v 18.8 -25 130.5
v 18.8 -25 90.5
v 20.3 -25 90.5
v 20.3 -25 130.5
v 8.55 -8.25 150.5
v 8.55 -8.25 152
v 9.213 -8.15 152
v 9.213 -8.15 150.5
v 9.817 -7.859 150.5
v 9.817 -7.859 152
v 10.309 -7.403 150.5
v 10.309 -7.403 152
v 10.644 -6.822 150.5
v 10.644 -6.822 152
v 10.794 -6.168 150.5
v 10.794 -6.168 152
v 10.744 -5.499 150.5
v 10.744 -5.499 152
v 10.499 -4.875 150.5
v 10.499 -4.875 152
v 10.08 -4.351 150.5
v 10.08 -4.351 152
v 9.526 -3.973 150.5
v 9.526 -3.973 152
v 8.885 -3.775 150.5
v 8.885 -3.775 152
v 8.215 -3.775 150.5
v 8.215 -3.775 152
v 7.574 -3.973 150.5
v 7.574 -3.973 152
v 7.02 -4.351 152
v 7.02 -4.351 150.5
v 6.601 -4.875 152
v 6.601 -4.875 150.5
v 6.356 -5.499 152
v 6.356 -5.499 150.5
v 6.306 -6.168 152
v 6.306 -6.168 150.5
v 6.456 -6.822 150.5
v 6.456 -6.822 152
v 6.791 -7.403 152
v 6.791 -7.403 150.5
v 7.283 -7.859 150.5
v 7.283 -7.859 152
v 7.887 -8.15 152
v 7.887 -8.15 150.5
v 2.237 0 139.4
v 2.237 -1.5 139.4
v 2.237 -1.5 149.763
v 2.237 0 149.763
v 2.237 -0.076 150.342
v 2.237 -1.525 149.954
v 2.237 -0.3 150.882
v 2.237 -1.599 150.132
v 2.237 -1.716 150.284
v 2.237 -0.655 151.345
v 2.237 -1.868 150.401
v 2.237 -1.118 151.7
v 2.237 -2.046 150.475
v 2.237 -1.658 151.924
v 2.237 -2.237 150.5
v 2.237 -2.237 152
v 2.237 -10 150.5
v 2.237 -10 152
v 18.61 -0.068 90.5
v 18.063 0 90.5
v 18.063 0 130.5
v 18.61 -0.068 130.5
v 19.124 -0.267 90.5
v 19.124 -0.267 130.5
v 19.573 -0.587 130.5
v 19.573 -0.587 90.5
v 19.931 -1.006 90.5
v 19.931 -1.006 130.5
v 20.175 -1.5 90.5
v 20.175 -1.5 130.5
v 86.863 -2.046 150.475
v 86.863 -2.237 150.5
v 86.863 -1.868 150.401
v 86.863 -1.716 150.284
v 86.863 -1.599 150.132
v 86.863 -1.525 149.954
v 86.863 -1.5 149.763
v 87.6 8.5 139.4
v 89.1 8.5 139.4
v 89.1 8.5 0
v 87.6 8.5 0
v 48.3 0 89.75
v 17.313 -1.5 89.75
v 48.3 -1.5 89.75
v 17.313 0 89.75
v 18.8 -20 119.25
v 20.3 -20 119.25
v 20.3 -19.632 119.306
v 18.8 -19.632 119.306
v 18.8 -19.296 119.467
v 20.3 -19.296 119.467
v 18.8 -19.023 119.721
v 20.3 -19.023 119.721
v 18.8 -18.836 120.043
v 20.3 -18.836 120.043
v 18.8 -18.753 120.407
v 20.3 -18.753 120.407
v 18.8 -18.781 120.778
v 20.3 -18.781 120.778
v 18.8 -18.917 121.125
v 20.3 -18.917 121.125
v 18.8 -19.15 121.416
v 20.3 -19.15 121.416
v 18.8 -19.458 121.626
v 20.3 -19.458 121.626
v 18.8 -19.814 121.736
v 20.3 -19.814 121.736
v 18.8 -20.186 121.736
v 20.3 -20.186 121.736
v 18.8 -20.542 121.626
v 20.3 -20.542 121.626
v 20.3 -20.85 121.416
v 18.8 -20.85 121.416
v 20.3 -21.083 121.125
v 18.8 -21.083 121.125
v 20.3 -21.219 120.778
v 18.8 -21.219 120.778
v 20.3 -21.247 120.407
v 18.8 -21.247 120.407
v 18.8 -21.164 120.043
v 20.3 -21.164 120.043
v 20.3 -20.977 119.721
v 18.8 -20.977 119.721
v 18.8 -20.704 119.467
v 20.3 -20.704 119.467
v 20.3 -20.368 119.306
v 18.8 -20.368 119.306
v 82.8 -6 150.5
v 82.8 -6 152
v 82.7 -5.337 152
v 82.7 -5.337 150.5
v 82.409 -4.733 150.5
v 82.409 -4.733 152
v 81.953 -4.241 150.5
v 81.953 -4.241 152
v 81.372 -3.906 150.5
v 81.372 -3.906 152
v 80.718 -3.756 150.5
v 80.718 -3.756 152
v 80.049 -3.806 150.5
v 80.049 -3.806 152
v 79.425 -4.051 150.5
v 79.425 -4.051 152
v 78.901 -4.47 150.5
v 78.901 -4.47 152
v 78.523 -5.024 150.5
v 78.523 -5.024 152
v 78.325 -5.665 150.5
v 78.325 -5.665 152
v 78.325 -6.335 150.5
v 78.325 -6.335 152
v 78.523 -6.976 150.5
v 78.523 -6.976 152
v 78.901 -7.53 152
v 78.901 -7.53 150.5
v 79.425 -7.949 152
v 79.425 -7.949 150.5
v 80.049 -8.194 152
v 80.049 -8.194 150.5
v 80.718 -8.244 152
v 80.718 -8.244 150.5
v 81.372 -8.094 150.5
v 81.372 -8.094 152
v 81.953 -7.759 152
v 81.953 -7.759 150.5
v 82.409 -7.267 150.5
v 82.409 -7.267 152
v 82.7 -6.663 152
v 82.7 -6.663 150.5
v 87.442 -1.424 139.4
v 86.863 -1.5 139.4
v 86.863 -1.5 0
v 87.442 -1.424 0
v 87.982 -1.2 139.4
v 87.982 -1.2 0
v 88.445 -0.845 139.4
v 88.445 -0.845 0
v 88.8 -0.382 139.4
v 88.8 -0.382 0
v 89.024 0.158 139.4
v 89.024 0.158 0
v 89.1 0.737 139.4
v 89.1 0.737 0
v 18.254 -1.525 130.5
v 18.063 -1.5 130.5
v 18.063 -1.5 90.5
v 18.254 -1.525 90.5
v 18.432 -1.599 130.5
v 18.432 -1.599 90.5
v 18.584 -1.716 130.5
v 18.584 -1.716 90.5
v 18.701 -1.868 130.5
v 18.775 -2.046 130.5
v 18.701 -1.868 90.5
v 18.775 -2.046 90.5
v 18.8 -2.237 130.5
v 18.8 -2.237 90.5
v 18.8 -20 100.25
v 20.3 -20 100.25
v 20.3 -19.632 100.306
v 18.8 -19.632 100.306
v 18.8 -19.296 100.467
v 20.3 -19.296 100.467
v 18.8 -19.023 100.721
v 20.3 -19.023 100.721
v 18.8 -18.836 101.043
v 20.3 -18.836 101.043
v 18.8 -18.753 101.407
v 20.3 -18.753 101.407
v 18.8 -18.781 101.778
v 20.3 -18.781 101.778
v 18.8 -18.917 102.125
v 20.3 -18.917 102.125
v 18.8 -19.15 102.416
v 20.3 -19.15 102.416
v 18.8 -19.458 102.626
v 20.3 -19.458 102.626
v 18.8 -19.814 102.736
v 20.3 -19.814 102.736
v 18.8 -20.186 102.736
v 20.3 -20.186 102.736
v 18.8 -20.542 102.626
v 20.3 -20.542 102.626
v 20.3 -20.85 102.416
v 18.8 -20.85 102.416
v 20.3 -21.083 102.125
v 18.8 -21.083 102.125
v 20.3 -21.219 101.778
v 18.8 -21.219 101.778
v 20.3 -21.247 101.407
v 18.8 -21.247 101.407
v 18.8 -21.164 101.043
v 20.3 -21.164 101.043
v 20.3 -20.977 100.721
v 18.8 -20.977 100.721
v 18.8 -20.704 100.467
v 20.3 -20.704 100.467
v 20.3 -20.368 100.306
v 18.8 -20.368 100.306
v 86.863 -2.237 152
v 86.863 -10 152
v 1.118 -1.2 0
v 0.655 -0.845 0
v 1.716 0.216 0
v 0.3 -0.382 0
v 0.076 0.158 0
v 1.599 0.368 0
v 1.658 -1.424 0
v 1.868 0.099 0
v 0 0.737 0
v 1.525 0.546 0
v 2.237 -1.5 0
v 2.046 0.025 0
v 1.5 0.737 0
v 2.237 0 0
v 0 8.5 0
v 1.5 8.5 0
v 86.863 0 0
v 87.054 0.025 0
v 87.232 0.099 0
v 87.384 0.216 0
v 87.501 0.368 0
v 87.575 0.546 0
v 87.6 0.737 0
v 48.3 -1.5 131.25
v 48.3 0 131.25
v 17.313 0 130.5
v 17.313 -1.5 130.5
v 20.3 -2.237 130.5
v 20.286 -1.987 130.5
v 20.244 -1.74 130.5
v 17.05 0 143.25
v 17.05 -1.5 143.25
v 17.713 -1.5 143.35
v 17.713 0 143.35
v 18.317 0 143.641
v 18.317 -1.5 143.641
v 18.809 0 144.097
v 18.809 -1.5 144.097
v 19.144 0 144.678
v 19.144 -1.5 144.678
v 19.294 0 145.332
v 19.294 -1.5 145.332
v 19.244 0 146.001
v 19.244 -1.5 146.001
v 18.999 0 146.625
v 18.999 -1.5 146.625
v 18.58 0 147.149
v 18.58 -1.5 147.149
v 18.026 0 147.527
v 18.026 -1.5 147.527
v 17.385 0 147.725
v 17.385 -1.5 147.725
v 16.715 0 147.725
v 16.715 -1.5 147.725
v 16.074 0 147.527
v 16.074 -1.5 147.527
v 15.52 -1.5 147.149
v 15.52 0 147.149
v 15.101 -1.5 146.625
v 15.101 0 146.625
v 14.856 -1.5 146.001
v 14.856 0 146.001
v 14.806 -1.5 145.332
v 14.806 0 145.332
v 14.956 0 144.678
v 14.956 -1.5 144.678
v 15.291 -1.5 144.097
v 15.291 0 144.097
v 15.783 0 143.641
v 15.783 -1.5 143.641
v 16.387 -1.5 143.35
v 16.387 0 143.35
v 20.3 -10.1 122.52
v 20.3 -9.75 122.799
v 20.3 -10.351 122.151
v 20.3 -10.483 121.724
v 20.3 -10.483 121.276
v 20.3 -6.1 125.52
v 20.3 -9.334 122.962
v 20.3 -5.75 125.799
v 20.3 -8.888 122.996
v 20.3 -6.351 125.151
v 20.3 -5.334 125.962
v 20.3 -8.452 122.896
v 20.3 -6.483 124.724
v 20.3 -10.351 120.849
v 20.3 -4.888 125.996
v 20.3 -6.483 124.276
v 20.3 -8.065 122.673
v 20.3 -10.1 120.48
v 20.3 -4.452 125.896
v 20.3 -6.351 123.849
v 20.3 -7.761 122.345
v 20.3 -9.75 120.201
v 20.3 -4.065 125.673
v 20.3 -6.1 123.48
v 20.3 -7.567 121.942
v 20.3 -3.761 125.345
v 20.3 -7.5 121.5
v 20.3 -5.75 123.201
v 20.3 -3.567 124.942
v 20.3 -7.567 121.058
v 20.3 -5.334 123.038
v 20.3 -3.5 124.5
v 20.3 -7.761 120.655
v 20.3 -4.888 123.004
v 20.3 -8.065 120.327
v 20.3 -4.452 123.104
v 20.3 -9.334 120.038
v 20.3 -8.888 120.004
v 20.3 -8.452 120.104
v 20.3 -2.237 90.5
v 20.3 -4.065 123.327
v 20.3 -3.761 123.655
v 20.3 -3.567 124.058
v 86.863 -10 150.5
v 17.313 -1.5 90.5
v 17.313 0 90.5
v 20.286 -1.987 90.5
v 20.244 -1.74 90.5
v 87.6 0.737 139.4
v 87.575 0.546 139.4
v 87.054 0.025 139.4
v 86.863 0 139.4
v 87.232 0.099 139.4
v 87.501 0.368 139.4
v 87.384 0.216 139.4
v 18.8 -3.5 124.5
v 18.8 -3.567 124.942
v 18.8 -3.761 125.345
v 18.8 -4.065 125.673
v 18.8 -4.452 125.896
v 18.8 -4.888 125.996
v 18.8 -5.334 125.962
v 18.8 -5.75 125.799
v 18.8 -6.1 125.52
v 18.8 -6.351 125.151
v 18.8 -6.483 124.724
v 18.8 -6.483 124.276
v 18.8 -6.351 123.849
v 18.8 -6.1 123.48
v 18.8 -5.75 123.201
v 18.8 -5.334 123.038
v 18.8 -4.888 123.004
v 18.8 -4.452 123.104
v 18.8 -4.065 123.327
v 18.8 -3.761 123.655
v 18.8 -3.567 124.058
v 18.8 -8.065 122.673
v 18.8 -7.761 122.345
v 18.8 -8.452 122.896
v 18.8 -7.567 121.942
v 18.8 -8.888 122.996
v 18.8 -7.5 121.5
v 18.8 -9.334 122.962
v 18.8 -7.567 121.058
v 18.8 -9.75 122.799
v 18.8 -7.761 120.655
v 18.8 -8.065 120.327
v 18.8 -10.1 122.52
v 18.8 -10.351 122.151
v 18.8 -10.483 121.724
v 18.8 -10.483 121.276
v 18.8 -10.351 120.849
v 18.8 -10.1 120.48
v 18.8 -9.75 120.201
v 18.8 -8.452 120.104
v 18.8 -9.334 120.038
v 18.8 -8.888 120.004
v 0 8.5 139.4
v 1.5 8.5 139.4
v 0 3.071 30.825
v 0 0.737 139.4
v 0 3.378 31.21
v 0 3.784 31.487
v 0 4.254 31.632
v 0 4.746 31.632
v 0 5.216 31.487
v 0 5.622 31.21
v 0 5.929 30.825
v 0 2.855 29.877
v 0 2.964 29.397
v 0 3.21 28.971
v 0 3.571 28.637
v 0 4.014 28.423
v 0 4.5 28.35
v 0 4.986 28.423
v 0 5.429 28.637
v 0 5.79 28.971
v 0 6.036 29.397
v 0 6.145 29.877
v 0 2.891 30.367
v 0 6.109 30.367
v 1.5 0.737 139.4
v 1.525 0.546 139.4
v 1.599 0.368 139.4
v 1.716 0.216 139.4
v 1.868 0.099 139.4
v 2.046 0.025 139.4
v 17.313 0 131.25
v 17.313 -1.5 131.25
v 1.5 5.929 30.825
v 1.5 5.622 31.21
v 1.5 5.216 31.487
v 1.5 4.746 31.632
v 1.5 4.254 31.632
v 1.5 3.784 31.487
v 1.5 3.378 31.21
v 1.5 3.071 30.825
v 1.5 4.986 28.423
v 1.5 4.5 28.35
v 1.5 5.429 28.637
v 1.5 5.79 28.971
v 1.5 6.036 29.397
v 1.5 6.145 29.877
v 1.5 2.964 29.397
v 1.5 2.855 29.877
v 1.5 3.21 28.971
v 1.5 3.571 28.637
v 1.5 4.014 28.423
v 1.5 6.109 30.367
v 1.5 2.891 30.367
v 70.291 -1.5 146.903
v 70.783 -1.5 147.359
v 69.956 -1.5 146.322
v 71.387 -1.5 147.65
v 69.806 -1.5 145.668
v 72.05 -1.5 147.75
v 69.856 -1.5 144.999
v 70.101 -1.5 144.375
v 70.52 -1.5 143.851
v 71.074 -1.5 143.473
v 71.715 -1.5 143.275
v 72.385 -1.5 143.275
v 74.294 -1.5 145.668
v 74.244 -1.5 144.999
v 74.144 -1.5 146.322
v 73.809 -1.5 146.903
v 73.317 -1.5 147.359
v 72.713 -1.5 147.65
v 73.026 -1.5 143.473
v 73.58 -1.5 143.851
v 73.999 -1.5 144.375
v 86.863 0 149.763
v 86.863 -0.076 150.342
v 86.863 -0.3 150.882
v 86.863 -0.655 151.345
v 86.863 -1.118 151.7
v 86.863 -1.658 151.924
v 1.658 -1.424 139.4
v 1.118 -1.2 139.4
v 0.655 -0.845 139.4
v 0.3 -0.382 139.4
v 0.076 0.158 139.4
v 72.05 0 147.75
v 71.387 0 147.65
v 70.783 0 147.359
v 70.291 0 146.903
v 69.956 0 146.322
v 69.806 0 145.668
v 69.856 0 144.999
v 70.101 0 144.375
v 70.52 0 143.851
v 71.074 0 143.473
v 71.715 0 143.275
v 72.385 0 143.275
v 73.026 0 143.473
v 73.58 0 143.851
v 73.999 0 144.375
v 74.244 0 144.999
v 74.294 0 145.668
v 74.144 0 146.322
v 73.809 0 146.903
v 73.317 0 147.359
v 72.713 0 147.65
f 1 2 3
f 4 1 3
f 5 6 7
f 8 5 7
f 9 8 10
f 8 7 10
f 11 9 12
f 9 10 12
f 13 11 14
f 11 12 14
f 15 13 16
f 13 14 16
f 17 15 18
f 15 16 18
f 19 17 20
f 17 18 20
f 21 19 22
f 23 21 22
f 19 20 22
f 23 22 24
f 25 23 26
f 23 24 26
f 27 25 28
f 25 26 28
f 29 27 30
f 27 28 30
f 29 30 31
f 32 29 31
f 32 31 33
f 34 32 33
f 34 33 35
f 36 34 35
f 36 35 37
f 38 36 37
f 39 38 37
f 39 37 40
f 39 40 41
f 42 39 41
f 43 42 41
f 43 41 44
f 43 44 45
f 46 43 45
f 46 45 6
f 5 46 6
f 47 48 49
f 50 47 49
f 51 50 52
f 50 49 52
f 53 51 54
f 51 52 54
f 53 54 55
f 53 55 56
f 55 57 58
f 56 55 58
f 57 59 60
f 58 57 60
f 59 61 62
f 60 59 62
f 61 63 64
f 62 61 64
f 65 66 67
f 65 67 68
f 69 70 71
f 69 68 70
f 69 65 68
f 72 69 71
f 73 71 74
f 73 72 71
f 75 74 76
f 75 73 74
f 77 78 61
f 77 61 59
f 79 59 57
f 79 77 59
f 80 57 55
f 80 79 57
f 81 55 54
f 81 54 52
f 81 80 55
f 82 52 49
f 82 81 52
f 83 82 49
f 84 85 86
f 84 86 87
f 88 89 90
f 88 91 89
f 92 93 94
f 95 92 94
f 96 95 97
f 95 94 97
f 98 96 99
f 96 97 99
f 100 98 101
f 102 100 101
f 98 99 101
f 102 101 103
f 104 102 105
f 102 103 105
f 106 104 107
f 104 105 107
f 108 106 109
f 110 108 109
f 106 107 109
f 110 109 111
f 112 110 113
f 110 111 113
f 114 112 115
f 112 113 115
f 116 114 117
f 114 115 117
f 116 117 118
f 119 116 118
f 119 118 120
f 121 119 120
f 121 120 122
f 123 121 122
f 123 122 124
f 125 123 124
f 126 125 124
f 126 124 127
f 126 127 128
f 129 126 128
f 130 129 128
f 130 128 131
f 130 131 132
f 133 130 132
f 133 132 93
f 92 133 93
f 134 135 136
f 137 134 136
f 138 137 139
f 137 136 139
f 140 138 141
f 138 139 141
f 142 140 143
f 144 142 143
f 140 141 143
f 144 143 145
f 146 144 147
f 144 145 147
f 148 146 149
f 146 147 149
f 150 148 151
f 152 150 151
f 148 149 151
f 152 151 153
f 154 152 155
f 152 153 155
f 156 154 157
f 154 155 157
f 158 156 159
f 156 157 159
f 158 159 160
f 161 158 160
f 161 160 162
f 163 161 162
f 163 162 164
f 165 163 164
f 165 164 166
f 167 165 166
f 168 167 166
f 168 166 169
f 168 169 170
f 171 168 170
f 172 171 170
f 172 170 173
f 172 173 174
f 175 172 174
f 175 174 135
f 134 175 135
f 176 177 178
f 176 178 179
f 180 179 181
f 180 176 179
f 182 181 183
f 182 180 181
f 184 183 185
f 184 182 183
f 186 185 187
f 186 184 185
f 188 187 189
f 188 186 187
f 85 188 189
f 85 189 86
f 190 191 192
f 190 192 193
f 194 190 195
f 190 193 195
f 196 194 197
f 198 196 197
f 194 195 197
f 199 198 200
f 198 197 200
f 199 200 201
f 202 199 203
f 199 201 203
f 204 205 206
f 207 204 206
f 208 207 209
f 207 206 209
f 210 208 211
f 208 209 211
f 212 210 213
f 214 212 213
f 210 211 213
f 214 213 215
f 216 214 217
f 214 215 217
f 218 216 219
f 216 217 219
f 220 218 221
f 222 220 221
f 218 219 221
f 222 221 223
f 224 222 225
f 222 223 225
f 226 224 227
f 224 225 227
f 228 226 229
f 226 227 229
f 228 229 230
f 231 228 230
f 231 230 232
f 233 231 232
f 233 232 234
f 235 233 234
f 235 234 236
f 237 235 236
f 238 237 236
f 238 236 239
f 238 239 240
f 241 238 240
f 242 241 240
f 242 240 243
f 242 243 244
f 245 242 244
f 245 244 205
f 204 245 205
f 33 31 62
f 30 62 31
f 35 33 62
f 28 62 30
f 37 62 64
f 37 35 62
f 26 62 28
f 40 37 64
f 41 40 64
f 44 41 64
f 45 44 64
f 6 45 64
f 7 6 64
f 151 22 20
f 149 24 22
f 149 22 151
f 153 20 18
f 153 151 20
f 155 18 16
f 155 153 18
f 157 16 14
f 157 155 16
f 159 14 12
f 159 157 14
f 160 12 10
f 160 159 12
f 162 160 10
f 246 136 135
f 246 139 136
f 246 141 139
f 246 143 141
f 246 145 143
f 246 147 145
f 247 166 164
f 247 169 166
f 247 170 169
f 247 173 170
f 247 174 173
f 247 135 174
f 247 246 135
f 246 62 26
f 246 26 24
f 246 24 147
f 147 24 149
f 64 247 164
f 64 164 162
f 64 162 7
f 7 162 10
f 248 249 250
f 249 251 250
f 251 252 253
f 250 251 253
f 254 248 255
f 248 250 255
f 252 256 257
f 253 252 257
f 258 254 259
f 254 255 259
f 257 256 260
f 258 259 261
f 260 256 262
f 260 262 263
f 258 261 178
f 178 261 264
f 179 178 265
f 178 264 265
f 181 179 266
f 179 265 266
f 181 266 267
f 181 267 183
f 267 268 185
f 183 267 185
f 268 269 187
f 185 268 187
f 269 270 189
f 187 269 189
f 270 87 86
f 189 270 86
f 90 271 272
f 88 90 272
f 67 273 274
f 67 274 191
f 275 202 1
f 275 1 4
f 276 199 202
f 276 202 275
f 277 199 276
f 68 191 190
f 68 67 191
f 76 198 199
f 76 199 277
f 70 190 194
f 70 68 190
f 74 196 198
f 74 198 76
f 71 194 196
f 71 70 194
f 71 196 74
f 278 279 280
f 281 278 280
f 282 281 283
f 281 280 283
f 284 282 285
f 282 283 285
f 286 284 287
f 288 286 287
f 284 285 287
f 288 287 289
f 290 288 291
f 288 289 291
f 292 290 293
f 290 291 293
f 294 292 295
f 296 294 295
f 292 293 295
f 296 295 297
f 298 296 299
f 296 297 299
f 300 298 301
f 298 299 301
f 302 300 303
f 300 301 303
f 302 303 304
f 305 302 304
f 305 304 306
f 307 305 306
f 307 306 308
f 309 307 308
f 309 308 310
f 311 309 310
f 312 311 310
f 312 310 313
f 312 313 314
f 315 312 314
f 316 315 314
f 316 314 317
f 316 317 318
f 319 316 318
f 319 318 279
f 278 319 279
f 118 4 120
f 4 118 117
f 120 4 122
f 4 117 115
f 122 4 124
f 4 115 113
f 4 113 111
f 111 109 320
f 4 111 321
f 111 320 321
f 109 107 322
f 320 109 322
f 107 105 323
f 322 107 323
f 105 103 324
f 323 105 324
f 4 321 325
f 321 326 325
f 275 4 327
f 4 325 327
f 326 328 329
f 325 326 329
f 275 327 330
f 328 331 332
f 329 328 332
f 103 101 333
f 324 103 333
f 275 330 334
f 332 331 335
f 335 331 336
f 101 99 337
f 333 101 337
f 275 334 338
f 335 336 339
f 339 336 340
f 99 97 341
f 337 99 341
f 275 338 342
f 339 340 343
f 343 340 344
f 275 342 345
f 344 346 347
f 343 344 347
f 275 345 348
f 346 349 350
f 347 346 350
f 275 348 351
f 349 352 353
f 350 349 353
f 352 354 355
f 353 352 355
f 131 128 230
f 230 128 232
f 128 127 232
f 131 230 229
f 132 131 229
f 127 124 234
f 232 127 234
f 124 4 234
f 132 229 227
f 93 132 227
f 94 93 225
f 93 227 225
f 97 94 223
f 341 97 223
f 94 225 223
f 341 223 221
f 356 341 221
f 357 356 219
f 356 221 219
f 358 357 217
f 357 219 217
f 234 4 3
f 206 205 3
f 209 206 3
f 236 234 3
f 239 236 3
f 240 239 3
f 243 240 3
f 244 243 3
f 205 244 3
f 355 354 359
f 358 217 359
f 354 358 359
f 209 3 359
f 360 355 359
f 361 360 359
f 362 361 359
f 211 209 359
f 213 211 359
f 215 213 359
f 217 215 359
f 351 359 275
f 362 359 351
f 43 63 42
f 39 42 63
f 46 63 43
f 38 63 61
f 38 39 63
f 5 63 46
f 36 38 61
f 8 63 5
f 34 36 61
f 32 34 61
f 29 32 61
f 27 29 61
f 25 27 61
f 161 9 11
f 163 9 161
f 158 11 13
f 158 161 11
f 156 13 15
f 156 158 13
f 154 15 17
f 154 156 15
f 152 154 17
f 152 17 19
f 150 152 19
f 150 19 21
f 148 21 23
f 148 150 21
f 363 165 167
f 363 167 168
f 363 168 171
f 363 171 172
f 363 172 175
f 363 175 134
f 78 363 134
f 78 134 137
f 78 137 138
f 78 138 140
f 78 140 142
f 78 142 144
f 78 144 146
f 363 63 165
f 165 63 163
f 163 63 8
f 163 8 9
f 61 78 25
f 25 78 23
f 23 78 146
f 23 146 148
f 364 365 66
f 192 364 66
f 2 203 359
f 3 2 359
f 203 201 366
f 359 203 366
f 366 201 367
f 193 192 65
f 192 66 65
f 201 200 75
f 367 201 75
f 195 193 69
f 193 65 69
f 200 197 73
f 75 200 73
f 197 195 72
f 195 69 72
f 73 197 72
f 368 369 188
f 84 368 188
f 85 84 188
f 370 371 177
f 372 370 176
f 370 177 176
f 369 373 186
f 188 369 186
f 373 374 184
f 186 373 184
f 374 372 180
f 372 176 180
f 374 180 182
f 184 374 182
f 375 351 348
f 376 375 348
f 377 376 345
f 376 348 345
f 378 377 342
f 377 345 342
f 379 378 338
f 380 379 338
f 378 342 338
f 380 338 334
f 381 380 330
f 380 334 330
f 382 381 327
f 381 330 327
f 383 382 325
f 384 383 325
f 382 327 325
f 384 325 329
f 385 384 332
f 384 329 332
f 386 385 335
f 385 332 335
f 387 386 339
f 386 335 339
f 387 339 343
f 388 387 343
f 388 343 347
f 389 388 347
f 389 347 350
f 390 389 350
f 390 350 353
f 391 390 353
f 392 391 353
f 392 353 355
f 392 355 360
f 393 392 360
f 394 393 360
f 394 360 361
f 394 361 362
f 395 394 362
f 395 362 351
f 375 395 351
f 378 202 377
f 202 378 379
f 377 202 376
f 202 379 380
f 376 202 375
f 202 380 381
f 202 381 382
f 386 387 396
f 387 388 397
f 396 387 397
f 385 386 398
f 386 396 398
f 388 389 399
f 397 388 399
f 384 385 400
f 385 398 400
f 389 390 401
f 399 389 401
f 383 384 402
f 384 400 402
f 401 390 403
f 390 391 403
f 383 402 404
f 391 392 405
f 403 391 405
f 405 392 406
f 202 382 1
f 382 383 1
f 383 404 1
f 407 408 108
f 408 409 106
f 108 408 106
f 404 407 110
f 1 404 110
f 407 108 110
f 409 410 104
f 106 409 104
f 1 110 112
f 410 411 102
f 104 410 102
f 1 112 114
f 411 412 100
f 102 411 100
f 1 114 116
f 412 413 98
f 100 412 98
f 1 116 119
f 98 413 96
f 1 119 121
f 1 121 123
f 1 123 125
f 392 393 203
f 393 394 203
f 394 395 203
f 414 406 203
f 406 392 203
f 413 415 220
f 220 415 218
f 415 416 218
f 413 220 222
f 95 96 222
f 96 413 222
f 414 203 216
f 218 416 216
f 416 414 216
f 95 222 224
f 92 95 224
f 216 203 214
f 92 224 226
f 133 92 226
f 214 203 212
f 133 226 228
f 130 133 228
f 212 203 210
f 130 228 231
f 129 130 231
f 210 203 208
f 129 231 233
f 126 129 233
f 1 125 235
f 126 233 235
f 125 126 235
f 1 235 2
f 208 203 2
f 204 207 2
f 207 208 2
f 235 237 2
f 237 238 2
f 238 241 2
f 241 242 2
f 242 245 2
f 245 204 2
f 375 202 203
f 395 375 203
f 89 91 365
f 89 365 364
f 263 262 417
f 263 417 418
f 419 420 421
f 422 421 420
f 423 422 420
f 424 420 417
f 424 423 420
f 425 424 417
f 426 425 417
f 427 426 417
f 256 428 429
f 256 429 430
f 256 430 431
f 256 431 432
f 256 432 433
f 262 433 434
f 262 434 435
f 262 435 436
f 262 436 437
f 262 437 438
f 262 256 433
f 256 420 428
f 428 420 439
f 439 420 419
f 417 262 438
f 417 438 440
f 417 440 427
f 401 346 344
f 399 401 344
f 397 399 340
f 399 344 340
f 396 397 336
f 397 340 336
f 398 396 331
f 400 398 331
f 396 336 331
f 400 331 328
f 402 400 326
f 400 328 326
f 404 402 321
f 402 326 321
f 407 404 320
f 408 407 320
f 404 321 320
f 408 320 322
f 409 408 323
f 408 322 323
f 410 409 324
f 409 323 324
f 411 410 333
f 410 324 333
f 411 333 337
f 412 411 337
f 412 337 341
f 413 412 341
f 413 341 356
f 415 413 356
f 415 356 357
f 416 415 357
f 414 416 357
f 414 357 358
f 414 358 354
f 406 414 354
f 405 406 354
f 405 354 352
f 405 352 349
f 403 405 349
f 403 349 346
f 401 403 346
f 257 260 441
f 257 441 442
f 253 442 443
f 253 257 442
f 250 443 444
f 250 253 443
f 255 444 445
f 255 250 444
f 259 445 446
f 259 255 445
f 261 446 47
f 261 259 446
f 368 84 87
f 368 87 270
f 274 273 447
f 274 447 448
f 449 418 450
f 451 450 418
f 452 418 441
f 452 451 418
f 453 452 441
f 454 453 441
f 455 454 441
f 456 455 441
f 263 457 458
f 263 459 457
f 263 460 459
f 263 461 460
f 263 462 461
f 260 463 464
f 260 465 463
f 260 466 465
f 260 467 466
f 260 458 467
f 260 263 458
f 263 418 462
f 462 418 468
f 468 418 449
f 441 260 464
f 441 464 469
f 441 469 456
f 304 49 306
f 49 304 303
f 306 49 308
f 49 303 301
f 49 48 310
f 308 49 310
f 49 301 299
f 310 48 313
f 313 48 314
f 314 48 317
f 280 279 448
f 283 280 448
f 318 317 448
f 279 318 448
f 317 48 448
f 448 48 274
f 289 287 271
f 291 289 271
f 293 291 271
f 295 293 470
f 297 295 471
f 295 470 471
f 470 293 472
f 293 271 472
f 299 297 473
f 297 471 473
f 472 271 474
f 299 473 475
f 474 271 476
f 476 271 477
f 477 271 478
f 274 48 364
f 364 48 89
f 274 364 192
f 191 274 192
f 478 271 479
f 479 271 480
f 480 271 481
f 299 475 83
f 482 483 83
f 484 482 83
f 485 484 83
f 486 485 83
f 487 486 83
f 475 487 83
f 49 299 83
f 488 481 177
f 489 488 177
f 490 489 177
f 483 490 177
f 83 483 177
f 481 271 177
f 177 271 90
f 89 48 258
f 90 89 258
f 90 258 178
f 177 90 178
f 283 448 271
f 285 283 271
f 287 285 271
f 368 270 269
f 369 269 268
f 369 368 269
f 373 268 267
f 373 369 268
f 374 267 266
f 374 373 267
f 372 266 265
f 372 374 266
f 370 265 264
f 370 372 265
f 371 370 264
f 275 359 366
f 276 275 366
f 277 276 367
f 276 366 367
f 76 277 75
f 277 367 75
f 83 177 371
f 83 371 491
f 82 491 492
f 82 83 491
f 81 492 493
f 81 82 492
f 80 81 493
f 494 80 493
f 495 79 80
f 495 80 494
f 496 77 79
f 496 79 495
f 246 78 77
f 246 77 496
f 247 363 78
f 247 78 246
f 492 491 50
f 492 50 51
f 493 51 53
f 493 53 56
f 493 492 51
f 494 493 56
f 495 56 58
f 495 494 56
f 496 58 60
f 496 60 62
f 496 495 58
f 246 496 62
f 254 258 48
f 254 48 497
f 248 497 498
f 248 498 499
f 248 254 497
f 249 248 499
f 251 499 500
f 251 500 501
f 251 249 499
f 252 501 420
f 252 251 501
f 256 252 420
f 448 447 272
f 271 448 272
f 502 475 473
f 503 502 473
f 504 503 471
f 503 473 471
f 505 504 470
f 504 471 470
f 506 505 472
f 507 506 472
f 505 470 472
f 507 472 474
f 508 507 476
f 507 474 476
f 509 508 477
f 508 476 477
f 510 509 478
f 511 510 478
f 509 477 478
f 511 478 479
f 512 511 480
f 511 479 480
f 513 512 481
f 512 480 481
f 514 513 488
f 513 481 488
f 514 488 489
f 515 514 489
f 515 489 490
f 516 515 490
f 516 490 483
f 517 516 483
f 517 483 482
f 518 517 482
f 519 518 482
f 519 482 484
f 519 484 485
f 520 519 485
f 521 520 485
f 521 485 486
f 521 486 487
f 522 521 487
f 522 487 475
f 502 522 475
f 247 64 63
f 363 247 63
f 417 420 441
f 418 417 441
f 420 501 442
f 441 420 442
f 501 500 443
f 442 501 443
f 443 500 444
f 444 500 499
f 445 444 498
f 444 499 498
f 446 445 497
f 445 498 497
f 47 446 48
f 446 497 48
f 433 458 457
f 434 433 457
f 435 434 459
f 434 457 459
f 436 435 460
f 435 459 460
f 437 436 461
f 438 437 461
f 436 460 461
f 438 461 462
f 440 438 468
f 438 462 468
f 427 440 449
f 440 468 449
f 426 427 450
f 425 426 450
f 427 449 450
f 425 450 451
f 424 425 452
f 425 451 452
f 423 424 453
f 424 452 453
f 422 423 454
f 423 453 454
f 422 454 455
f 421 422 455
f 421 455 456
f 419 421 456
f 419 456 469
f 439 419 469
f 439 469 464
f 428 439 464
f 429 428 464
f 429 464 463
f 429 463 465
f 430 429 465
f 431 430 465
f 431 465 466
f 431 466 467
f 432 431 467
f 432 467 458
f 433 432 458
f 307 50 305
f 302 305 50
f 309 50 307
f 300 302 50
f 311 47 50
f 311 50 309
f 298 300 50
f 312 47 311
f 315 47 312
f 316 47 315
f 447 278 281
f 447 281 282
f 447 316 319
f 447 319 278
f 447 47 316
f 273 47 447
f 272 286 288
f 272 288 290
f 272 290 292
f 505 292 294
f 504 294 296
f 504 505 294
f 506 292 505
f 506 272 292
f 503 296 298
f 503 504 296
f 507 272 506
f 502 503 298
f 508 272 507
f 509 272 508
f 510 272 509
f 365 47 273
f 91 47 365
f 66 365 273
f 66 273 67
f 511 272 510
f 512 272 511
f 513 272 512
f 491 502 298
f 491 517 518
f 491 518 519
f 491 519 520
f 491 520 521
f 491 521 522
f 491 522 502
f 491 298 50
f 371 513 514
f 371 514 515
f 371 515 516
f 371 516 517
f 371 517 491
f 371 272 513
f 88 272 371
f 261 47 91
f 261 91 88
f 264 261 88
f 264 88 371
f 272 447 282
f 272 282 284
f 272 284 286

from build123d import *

# Parameters (mm, degrees)
SKETCH_2_W                       = 89.1
SKETCH_2_H                       = 1.5
SM_BASE_FLANGE_1_DEPTH           = 152
SM_EDGE_FLANGE_1_STRIP_W         = 7.4732
SM_EDGE_FLANGE_1_STRIP_H         = 1.5
SM_EDGE_FLANGE_1_STRIP_CUT_DEPTH = 152
SM_EDGE_FLANGE_1_DEPTH           = 152
SM_EDGE_FLANGE_2_STRIP_W         = 7.4732
SM_EDGE_FLANGE_2_STRIP_H         = 1.5
SM_EDGE_FLANGE_2_STRIP_CUT_DEPTH = 152
SM_EDGE_FLANGE_2_DEPTH           = 152
SKETCH_13_W                      = 16.114616681
SKETCH_13_H                      = 12.6
SKETCH_13_W_2                    = 14.895249376
CUT_EXTRUDE_1_DEPTH              = 177.473255764
SM_EDGE_FLANGE_3_STRIP_W         = 7.4732
SM_EDGE_FLANGE_3_STRIP_H         = 1.5
SM_EDGE_FLANGE_3_STRIP_CUT_DEPTH = 84.6268
SM_EDGE_FLANGE_3_DEPTH           = 84.6268
SKETCH_17_R                      = 2.25
CUT_EXTRUDE_2_DEPTH              = 10
SKETCH_18_R                      = 2.25
CUT_EXTRUDE_3_DEPTH              = 10
SKETCH_19_W                      = 28
SKETCH_19_H                      = 40
CUT_EXTRUDE_4_DEPTH              = 10
SM_START                         = 89.75
SM_EDGE_FLANGE_4_DEPTH           = 41.5
SM_EDGE_FLANGE_4_2_DEPTH         = 0.75
SM_START_2                       = 130.5
SM_EDGE_FLANGE_4_3_DEPTH         = 0.75
SM_START_3                       = 90.5
SM_EDGE_FLANGE_4_4_DEPTH         = 40
HOLE_WIZARD_M3_1_D               = 2.5
HOLE_WIZARD_M3_1_DEPTH           = 7.5
HOLE_WIZARD_M3_1_TIP             = 0.751075774
HOLE_WIZARD_M4_1_D               = 3.3
HOLE_WIZARD_M4_1_DEPTH           = 10.1
HOLE_WIZARD_M4_1_TIP             = 0.991420021
SKETCH_27_R                      = 1.5
CUT_EXTRUDE_5_DEPTH              = 20
SKETCH_28_R                      = 1.5
CUT_EXTRUDE_6_DEPTH              = 10
CUT_EXTRUDE_START                = -0.75
SKETCH_29_W                      = 28
SKETCH_29_H                      = 1.5
CUT_EXTRUDE_7_DEPTH              = 0.75
SKETCH_30_W                      = 28
SKETCH_30_H                      = 1.5
CUT_EXTRUDE_8_DEPTH              = 0.75


# Read off the part's stored shape, not the designer's step: 边线-法兰4
# Sheet-metal steps are written as plain solids
with BuildPart() as part:
    # Sketch 2 → 基体-法兰1 (new body)
    with BuildSketch(Plane.XY):
        with Locations((44.55, -0.75)):
            Rectangle(SKETCH_2_W, SKETCH_2_H)
    extrude(amount=SM_BASE_FLANGE_1_DEPTH)

    # 边线-法兰1 strip (across the edge) → 边线-法兰1 strip cut (cut)
    with BuildSketch(Plane.XY):
        with Locations((-1.5, -0.75)):
            Rectangle(SM_EDGE_FLANGE_1_STRIP_W, SM_EDGE_FLANGE_1_STRIP_H)
    extrude(amount=SM_EDGE_FLANGE_1_STRIP_CUT_DEPTH, mode=Mode.SUBTRACT)

    # 边线-法兰1 section (across the edge) → 边线-法兰1 (add)
    with BuildSketch(Plane.XY):
        with BuildLine():
            Line((0, 0.7366), (0, 8.5))
            Line((0, 8.5), (1.5, 8.5))
            Line((1.5, 8.5), (1.5, 0.7366))
            ThreePointArc((1.5, 0.7366), (1.715745145, 0.215745145), (2.2366, 0))
            Line((2.2366, 0), (2.2366, -1.5))
            ThreePointArc((2.2366, -1.5), (0.655084973, -0.844915027), (0, 0.7366))
        make_face()
    extrude(amount=SM_EDGE_FLANGE_1_DEPTH)

    # 边线-法兰2 strip (across the edge) → 边线-法兰2 strip cut (cut)
    with BuildSketch(Plane(origin=(89.1, 0, 152), x_dir=(-1, 0, 0), z_dir=(0, 0, -1))):
        with Locations((-1.5, -0.75)):
            Rectangle(SM_EDGE_FLANGE_2_STRIP_W, SM_EDGE_FLANGE_2_STRIP_H)
    extrude(amount=SM_EDGE_FLANGE_2_STRIP_CUT_DEPTH, mode=Mode.SUBTRACT)

    # 边线-法兰2 section (across the edge) → 边线-法兰2 (add)
    with BuildSketch(Plane(origin=(89.1, 0, 152), x_dir=(-1, 0, 0), z_dir=(0, 0, -1))):
        with BuildLine():
            Line((0, 0.7366), (0, 8.5))
            Line((0, 8.5), (1.5, 8.5))
            Line((1.5, 8.5), (1.5, 0.7366))
            ThreePointArc((1.5, 0.7366), (1.715745145, 0.215745145), (2.2366, 0))
            Line((2.2366, 0), (2.2366, -1.5))
            ThreePointArc((2.2366, -1.5), (0.655084973, -0.844915027), (0, 0.7366))
        make_face()
    extrude(amount=SM_EDGE_FLANGE_2_DEPTH)

    # 草图13 → 切除-拉伸1 (cut, through all)
    with BuildSketch(Plane.XZ.offset(1.5)):
        with Locations((-5.82070834, 145.7)):
            Rectangle(SKETCH_13_W, SKETCH_13_H)
        with Locations((94.311024688, 145.7)):
            Rectangle(SKETCH_13_W_2, SKETCH_13_H)
    extrude(amount=-CUT_EXTRUDE_1_DEPTH, mode=Mode.SUBTRACT)

    # 边线-法兰3 strip (across the edge) → 边线-法兰3 strip cut (cut)
    with BuildSketch(Plane(origin=(86.8634, -1.5, 152), x_dir=(0, 0, -1), z_dir=(-1, 0, 0))):
        with Locations((-1.5, -0.75)):
            Rectangle(SM_EDGE_FLANGE_3_STRIP_W, SM_EDGE_FLANGE_3_STRIP_H)
    extrude(amount=SM_EDGE_FLANGE_3_STRIP_CUT_DEPTH, mode=Mode.SUBTRACT)

    # 边线-法兰3 section (across the edge) → 边线-法兰3 (add)
    with BuildSketch(Plane(origin=(86.8634, -1.5, 152), x_dir=(0, 0, -1), z_dir=(-1, 0, 0))):
        with BuildLine():
            Line((0, 0.7366), (0, 8.5))
            Line((0, 8.5), (1.5, 8.5))
            Line((1.5, 8.5), (1.5, 0.7366))
            ThreePointArc((1.5, 0.7366), (1.715745145, 0.215745145), (2.2366, 0))
            Line((2.2366, 0), (2.2366, -1.5))
            ThreePointArc((2.2366, -1.5), (0.655084973, -0.844915027), (0, 0.7366))
        make_face()
    extrude(amount=SM_EDGE_FLANGE_3_DEPTH)

    # 草图17 → 切除-拉伸2 (cut)
    with BuildSketch(Plane.XY.offset(152)):
        with Locations((80.55, -6)):
            Circle(SKETCH_17_R)
        with Locations(Location((8.55, -6, 0), (0, 0, 270))):
            Circle(SKETCH_17_R)
    extrude(amount=-CUT_EXTRUDE_2_DEPTH, mode=Mode.SUBTRACT)

    # 草图18 → 切除-拉伸3 (cut)
    with BuildSketch(Plane.XZ.offset(1.5)):
        with Locations(Location((17.05, 145.5, 0), (0, 0, 270))):
            Circle(SKETCH_18_R)
        with Locations(Location((72.05, 145.5, 0), (0, 0, 90))):
            Circle(SKETCH_18_R)
    extrude(amount=-CUT_EXTRUDE_3_DEPTH, mode=Mode.SUBTRACT)

    # 草图19 → 切除-拉伸4 (cut)
    with BuildSketch(Plane.XZ.offset(1.5)):
        with Locations((34.3, 110.5)):
            Rectangle(SKETCH_19_W, SKETCH_19_H)
    extrude(amount=-CUT_EXTRUDE_4_DEPTH, mode=Mode.SUBTRACT)

    # 边线-法兰4 outline → 边线-法兰4 (cut)
    with BuildSketch(Plane.XY.offset(SM_START)):
        with BuildLine():
            Line((20.3, -1.5), (20.3, 0))
            Line((20.3, 0), (18.0634, 0))
            ThreePointArc((18.0634, 0), (19.358564082, -0.413161062), (20.175223856, -1.5))
            Line((20.175223856, -1.5), (20.3, -1.5))
        make_face()
    extrude(amount=SM_EDGE_FLANGE_4_DEPTH, mode=Mode.SUBTRACT)

    # Sm Edge Flange 4 2 outline → Sm Edge Flange 4 2 (cut)
    with BuildSketch(Plane.XY.offset(SM_START)):
        with BuildLine():
            ThreePointArc((20.175223856, -1.5), (19.358564082, -0.413161062), (18.0634, 0))
            Line((18.0634, 0), (17.3134, 0))
            Line((17.3134, 0), (17.3134, -1.5))
            Line((17.3134, -1.5), (20.175223856, -1.5))
        make_face()
    extrude(amount=SM_EDGE_FLANGE_4_2_DEPTH, mode=Mode.SUBTRACT)

    # Sm Edge Flange 4 3 outline → Sm Edge Flange 4 3 (cut)
    with BuildSketch(Plane.XY.offset(SM_START_2)):
        with BuildLine():
            ThreePointArc((20.175223856, -1.5), (19.358564082, -0.413161062), (18.0634, 0))
            Line((18.0634, 0), (17.3134, 0))
            Line((17.3134, 0), (17.3134, -1.5))
            Line((17.3134, -1.5), (20.175223856, -1.5))
        make_face()
    extrude(amount=SM_EDGE_FLANGE_4_3_DEPTH, mode=Mode.SUBTRACT)

    # Sm Edge Flange 4 4 outline → Sm Edge Flange 4 4 (add)
    with BuildSketch(Plane.XY.offset(SM_START_3)):
        with BuildLine():
            ThreePointArc((20.3, -2.2366), (20.268585343, -1.863053267), (20.175223856, -1.5))
            Line((20.175223856, -1.5), (18.0634, -1.5))
            ThreePointArc((18.0634, -1.5), (18.584254855, -1.715745145), (18.8, -2.2366))
            Line((18.8, -2.2366), (18.8, -25))
            Line((18.8, -25), (20.3, -25))
            Line((20.3, -25), (20.3, -2.2366))
        make_face()
    extrude(amount=SM_EDGE_FLANGE_4_4_DEPTH)

    # M3 螺纹孔1
    with Locations(Plane.ZY.offset(-18.8)):
        with Locations((101.5, -20), (120.5, -20)):
            Hole(HOLE_WIZARD_M3_1_D / 2, depth=HOLE_WIZARD_M3_1_DEPTH)
            with Locations((0, 0, -(HOLE_WIZARD_M3_1_DEPTH + HOLE_WIZARD_M3_1_TIP / 2))):  # 118° drill point
                Cone(0, HOLE_WIZARD_M3_1_D / 2, HOLE_WIZARD_M3_1_TIP, mode=Mode.SUBTRACT)

    # M4 螺纹孔1
    with Locations(Plane.ZY):
        with Locations((30, 4.5)):
            Hole(HOLE_WIZARD_M4_1_D / 2, depth=HOLE_WIZARD_M4_1_DEPTH)
            with Locations((0, 0, -(HOLE_WIZARD_M4_1_DEPTH + HOLE_WIZARD_M4_1_TIP / 2))):  # 118° drill point
                Cone(0, HOLE_WIZARD_M4_1_D / 2, HOLE_WIZARD_M4_1_TIP, mode=Mode.SUBTRACT)

    # 草图27 → 切除-拉伸5 (cut)
    with BuildSketch(Plane(origin=(20.3, 0, 0), x_dir=(0, 0, -1), z_dir=(1, 0, 0))):
        with Locations(Location((-121.5, -9, 0), (0, 0, 90))):
            Circle(SKETCH_27_R)
    extrude(amount=-CUT_EXTRUDE_5_DEPTH, mode=Mode.SUBTRACT)

    # 草图28 → 切除-拉伸6 (cut)
    with BuildSketch(Plane(origin=(20.3, 0, 0), x_dir=(0, 0, -1), z_dir=(1, 0, 0))):
        with Locations(Location((-124.5, -5, 0), (0, 0, 90))):
            Circle(SKETCH_28_R)
    extrude(amount=-CUT_EXTRUDE_6_DEPTH, mode=Mode.SUBTRACT)

    # 草图29 → 切除-拉伸7 (cut)
    with BuildSketch(Plane.XY.offset(90.5).offset(CUT_EXTRUDE_START)):
        with Locations((34.3, -0.75)):
            Rectangle(SKETCH_29_W, SKETCH_29_H)
    extrude(amount=CUT_EXTRUDE_7_DEPTH, mode=Mode.SUBTRACT)

    # 草图30 → 切除-拉伸8 (cut)
    with BuildSketch(Plane(origin=(0, 0, 130.5), x_dir=(-1, 0, 0), z_dir=(0, 0, -1)).offset(CUT_EXTRUDE_START)):
        with Locations((-34.3, -0.75)):
            Rectangle(SKETCH_30_W, SKETCH_30_H)
    extrude(amount=CUT_EXTRUDE_8_DEPTH, mode=Mode.SUBTRACT)


solid = part.part
